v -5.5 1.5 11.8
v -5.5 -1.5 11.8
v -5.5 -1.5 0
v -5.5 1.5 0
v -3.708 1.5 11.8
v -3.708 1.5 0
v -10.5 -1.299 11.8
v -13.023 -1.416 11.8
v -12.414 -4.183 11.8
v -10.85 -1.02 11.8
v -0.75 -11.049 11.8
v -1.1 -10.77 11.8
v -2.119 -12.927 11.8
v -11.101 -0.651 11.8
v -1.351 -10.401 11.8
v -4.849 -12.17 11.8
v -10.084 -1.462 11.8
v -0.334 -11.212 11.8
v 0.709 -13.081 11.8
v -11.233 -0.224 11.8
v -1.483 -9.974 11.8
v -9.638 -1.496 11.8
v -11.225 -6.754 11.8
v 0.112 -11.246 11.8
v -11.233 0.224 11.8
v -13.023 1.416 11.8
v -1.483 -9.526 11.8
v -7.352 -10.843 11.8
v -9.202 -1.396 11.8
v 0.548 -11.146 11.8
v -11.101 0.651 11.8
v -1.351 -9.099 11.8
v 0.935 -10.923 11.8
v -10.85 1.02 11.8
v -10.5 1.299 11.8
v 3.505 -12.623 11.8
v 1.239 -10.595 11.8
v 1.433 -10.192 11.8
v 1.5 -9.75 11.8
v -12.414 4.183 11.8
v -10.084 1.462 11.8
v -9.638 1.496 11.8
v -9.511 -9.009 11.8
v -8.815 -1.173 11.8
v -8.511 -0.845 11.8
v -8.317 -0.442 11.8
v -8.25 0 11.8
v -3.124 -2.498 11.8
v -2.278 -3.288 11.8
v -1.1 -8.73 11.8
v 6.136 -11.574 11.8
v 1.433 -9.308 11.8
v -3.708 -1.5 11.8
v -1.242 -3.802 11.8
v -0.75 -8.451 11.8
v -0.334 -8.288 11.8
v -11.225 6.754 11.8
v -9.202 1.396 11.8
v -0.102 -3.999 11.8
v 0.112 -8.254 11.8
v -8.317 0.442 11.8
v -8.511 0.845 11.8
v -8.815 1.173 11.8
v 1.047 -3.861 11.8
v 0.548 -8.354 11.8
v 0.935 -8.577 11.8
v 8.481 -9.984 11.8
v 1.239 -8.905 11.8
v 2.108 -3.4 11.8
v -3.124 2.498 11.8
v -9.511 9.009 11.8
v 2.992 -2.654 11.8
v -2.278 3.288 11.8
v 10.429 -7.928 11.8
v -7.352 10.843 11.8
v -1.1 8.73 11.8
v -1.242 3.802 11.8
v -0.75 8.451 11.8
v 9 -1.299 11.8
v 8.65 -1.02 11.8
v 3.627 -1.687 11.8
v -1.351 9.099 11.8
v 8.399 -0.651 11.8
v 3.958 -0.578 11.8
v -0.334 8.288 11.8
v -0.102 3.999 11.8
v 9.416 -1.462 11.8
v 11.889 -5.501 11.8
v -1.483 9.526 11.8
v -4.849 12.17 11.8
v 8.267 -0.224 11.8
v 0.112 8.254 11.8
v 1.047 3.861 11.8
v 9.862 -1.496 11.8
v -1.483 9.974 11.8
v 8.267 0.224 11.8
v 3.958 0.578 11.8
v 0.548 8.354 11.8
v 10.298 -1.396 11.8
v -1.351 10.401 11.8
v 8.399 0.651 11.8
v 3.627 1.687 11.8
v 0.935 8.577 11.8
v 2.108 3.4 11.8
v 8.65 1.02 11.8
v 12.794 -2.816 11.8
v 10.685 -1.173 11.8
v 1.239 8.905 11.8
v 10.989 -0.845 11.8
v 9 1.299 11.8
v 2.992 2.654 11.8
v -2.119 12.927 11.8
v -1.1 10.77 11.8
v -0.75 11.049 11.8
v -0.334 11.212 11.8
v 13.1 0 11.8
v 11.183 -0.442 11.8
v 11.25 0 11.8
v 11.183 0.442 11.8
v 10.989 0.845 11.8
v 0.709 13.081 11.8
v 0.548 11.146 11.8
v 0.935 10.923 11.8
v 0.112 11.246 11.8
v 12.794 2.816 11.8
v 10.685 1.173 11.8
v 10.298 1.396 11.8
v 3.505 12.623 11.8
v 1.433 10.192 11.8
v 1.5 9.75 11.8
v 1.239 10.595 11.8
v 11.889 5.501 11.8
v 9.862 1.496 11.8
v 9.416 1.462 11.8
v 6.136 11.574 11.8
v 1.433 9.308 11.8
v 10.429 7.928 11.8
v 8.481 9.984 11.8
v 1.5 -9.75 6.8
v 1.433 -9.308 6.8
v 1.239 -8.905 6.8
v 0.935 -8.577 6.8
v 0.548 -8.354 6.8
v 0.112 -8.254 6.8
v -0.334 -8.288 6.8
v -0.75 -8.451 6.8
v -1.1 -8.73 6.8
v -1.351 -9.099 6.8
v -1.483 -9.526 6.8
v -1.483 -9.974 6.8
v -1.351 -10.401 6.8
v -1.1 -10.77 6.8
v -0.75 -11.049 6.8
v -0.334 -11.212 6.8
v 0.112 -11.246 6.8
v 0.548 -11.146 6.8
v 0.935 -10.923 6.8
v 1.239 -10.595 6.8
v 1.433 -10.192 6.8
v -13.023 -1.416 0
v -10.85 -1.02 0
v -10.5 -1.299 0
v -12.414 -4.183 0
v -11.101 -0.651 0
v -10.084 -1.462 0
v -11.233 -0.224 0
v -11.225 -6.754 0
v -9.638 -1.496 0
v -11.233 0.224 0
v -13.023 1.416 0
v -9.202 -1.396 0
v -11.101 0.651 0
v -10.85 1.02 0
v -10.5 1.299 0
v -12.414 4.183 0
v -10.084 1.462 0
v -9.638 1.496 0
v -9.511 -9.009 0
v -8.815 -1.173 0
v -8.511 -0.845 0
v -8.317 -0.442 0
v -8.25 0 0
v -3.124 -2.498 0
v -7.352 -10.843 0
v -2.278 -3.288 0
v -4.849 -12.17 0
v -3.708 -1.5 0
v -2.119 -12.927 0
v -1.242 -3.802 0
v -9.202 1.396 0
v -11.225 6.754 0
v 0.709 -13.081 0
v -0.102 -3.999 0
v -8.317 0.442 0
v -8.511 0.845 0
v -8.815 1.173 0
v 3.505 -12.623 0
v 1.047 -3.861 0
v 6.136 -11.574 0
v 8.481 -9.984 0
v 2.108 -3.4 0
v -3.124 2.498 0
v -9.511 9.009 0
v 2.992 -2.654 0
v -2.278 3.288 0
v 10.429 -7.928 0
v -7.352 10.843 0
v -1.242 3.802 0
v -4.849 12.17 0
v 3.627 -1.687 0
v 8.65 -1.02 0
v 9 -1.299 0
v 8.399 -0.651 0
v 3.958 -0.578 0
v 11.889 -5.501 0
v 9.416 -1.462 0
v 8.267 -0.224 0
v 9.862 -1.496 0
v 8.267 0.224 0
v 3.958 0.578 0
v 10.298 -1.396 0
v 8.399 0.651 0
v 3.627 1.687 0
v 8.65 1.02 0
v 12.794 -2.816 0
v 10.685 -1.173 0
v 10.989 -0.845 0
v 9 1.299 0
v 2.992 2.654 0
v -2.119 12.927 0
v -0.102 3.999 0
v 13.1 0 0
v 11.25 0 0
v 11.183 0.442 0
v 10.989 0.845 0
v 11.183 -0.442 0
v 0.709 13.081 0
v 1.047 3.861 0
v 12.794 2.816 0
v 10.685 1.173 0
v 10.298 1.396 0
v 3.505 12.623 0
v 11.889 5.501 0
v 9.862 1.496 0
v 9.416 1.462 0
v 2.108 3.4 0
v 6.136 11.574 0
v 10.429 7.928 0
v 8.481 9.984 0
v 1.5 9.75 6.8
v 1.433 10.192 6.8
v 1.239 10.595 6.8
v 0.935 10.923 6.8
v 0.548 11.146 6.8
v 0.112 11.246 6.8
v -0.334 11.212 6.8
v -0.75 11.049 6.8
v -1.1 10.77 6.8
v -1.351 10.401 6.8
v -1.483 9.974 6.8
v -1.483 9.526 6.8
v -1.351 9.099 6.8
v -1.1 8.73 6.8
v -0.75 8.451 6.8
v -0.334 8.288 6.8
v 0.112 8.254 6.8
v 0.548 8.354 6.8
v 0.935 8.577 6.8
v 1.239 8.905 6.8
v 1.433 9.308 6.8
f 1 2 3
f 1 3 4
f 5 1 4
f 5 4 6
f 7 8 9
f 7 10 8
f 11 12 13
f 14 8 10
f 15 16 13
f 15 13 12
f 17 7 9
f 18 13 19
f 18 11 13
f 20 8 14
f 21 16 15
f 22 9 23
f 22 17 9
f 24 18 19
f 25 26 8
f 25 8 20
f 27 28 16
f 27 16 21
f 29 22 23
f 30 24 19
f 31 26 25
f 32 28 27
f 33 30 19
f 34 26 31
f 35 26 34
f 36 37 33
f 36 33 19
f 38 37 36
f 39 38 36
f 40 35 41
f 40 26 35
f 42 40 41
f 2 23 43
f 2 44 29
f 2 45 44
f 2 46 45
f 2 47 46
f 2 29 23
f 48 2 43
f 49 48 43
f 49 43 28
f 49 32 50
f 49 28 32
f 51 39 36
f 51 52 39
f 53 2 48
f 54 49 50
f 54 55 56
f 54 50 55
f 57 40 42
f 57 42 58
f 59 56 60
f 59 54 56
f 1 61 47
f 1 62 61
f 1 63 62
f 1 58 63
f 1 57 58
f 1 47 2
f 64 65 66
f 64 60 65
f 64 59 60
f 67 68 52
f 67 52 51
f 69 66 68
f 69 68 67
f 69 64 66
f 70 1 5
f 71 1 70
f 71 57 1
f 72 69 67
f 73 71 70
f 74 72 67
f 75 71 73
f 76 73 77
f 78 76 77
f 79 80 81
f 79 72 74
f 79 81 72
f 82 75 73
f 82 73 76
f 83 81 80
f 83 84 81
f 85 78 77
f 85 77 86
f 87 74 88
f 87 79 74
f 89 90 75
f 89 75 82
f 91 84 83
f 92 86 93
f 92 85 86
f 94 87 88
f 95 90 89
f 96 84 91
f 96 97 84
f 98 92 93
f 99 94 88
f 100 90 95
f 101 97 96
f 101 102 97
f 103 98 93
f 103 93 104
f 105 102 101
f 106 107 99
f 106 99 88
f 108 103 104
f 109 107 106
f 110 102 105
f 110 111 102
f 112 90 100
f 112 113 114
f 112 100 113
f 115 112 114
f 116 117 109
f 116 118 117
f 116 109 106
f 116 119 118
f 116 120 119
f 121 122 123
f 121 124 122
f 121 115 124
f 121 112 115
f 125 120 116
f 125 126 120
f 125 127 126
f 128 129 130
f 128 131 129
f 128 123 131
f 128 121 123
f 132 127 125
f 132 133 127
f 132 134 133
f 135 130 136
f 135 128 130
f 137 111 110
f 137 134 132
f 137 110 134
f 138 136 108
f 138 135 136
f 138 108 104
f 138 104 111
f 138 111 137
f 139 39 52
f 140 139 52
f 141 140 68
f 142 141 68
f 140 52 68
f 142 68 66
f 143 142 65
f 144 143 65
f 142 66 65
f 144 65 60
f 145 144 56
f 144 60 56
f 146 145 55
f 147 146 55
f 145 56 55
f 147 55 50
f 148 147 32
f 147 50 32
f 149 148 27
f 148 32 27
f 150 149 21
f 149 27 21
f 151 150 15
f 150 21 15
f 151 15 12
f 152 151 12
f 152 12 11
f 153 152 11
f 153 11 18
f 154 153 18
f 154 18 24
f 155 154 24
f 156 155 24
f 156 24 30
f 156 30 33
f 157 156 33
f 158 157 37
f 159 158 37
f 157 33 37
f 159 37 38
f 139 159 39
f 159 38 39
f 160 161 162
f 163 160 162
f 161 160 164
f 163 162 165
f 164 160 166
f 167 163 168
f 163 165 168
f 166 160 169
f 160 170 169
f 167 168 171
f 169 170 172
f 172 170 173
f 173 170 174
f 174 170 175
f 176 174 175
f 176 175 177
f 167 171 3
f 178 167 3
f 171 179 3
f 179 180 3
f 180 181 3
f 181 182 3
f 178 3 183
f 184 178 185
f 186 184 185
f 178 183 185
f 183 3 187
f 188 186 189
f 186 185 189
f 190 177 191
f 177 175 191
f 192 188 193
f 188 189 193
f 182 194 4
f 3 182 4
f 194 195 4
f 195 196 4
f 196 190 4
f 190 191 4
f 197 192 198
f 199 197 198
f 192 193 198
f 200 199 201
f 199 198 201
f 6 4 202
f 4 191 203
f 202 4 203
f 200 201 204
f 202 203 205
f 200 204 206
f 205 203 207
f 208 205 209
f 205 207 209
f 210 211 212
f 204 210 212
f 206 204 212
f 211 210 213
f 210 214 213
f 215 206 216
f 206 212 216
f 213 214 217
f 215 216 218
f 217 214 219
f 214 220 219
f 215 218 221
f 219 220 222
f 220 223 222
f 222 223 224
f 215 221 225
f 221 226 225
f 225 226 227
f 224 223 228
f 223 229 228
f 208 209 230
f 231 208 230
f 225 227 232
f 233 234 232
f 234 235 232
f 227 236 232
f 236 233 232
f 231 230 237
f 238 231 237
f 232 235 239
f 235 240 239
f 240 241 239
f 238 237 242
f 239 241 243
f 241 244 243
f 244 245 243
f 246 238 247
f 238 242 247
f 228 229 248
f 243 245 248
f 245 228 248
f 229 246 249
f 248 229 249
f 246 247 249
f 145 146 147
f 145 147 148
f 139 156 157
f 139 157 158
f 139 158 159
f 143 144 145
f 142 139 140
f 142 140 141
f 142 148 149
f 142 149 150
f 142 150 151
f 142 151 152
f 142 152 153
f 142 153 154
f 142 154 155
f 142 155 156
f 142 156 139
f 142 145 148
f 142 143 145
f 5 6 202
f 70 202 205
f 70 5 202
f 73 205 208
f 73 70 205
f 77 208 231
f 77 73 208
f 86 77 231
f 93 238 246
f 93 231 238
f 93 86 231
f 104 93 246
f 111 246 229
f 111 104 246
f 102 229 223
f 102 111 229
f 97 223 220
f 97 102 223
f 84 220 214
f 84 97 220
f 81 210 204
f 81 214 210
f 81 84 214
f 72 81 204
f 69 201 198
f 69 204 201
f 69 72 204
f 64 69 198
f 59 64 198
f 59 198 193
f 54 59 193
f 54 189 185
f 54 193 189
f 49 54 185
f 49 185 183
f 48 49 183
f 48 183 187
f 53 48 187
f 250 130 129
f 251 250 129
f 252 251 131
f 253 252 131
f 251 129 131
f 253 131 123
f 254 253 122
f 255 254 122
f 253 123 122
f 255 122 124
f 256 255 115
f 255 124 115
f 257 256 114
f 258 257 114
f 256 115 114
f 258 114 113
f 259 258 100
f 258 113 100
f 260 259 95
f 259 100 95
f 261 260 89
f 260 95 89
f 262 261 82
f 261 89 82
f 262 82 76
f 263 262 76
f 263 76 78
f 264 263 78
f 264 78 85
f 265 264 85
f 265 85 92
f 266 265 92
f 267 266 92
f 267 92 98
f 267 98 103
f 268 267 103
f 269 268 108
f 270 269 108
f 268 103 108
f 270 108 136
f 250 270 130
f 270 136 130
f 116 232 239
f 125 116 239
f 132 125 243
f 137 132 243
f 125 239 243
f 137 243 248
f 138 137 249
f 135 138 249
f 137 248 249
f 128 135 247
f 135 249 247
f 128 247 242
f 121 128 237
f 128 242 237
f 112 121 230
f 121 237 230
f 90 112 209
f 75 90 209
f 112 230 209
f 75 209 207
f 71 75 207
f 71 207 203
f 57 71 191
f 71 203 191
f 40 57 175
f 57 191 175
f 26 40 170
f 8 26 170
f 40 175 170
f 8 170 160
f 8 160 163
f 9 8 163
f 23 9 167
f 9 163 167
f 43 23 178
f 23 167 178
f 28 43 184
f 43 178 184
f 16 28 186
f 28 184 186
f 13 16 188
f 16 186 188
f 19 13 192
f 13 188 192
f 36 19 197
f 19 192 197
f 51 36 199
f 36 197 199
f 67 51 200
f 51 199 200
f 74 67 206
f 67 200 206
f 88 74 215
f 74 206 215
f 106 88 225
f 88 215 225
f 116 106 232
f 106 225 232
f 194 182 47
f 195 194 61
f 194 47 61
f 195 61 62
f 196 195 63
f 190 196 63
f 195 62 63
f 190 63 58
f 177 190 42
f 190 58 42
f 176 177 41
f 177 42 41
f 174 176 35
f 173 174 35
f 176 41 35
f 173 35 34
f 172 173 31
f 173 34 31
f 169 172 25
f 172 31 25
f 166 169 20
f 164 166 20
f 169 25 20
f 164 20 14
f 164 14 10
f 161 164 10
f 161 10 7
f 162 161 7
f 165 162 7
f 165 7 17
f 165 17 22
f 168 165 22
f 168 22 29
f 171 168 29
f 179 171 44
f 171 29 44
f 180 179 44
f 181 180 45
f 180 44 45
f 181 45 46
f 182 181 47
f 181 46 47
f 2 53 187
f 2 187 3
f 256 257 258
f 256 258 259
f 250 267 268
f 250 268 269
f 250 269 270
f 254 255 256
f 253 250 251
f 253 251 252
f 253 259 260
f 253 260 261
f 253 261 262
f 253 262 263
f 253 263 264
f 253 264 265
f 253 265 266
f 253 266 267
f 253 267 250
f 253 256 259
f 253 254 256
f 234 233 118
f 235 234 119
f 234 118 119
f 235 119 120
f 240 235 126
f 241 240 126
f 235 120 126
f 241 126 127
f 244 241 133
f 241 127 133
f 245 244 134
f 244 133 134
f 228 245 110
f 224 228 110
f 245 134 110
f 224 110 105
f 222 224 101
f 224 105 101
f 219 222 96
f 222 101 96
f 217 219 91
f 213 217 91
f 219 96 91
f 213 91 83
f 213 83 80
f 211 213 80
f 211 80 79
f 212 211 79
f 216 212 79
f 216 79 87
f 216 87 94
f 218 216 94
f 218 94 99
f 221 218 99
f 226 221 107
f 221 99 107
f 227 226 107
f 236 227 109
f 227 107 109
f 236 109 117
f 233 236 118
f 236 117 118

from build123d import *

# Parameters (mm, degrees)
SKETCH_1_R          = 13.1
EXTRUDE_1_DEPTH     = 11.8
SKETCH_3_R          = 1.5
CUT_EXTRUDE_1_DEPTH = 5
SKETCH_4_R          = 1.5
CUT_EXTRUDE_2_DEPTH = 15


with BuildPart() as part:
    # 草图1 → 凸台-拉伸1 (new body)
    with BuildSketch(Plane.XY):
        Circle(SKETCH_1_R)
    extrude(amount=EXTRUDE_1_DEPTH)

    # 草图3 → 切除-拉伸1 (cut)
    with BuildSketch(Plane.XY.offset(11.8)):
        with Locations((-9.75, 0)):
            Circle(SKETCH_3_R)
        with Locations((0, 9.75)):
            Circle(SKETCH_3_R)
        with Locations((9.75, 0)):
            Circle(SKETCH_3_R)
        with Locations((0, -9.75)):
            Circle(SKETCH_3_R)
    extrude(amount=-CUT_EXTRUDE_1_DEPTH, mode=Mode.SUBTRACT)

    # 草图4 → 切除-拉伸2 (cut)
    with BuildSketch(Plane.XY.offset(11.8)):
        with Locations((-9.75, 0)):
            Circle(SKETCH_4_R)
        with Locations((9.75, 0)):
            Circle(SKETCH_4_R)
        with BuildLine():
            Line((-5.5, -1.5), (-5.5, 1.5))
            Line((-5.5, 1.5), (-3.708099244, 1.5))
            ThreePointArc((-3.708099244, 1.5), (4, 0), (-3.708099244, -1.5))
            Line((-3.708099244, -1.5), (-5.5, -1.5))
        make_face()
    extrude(amount=-CUT_EXTRUDE_2_DEPTH, mode=Mode.SUBTRACT)


solid = part.part
